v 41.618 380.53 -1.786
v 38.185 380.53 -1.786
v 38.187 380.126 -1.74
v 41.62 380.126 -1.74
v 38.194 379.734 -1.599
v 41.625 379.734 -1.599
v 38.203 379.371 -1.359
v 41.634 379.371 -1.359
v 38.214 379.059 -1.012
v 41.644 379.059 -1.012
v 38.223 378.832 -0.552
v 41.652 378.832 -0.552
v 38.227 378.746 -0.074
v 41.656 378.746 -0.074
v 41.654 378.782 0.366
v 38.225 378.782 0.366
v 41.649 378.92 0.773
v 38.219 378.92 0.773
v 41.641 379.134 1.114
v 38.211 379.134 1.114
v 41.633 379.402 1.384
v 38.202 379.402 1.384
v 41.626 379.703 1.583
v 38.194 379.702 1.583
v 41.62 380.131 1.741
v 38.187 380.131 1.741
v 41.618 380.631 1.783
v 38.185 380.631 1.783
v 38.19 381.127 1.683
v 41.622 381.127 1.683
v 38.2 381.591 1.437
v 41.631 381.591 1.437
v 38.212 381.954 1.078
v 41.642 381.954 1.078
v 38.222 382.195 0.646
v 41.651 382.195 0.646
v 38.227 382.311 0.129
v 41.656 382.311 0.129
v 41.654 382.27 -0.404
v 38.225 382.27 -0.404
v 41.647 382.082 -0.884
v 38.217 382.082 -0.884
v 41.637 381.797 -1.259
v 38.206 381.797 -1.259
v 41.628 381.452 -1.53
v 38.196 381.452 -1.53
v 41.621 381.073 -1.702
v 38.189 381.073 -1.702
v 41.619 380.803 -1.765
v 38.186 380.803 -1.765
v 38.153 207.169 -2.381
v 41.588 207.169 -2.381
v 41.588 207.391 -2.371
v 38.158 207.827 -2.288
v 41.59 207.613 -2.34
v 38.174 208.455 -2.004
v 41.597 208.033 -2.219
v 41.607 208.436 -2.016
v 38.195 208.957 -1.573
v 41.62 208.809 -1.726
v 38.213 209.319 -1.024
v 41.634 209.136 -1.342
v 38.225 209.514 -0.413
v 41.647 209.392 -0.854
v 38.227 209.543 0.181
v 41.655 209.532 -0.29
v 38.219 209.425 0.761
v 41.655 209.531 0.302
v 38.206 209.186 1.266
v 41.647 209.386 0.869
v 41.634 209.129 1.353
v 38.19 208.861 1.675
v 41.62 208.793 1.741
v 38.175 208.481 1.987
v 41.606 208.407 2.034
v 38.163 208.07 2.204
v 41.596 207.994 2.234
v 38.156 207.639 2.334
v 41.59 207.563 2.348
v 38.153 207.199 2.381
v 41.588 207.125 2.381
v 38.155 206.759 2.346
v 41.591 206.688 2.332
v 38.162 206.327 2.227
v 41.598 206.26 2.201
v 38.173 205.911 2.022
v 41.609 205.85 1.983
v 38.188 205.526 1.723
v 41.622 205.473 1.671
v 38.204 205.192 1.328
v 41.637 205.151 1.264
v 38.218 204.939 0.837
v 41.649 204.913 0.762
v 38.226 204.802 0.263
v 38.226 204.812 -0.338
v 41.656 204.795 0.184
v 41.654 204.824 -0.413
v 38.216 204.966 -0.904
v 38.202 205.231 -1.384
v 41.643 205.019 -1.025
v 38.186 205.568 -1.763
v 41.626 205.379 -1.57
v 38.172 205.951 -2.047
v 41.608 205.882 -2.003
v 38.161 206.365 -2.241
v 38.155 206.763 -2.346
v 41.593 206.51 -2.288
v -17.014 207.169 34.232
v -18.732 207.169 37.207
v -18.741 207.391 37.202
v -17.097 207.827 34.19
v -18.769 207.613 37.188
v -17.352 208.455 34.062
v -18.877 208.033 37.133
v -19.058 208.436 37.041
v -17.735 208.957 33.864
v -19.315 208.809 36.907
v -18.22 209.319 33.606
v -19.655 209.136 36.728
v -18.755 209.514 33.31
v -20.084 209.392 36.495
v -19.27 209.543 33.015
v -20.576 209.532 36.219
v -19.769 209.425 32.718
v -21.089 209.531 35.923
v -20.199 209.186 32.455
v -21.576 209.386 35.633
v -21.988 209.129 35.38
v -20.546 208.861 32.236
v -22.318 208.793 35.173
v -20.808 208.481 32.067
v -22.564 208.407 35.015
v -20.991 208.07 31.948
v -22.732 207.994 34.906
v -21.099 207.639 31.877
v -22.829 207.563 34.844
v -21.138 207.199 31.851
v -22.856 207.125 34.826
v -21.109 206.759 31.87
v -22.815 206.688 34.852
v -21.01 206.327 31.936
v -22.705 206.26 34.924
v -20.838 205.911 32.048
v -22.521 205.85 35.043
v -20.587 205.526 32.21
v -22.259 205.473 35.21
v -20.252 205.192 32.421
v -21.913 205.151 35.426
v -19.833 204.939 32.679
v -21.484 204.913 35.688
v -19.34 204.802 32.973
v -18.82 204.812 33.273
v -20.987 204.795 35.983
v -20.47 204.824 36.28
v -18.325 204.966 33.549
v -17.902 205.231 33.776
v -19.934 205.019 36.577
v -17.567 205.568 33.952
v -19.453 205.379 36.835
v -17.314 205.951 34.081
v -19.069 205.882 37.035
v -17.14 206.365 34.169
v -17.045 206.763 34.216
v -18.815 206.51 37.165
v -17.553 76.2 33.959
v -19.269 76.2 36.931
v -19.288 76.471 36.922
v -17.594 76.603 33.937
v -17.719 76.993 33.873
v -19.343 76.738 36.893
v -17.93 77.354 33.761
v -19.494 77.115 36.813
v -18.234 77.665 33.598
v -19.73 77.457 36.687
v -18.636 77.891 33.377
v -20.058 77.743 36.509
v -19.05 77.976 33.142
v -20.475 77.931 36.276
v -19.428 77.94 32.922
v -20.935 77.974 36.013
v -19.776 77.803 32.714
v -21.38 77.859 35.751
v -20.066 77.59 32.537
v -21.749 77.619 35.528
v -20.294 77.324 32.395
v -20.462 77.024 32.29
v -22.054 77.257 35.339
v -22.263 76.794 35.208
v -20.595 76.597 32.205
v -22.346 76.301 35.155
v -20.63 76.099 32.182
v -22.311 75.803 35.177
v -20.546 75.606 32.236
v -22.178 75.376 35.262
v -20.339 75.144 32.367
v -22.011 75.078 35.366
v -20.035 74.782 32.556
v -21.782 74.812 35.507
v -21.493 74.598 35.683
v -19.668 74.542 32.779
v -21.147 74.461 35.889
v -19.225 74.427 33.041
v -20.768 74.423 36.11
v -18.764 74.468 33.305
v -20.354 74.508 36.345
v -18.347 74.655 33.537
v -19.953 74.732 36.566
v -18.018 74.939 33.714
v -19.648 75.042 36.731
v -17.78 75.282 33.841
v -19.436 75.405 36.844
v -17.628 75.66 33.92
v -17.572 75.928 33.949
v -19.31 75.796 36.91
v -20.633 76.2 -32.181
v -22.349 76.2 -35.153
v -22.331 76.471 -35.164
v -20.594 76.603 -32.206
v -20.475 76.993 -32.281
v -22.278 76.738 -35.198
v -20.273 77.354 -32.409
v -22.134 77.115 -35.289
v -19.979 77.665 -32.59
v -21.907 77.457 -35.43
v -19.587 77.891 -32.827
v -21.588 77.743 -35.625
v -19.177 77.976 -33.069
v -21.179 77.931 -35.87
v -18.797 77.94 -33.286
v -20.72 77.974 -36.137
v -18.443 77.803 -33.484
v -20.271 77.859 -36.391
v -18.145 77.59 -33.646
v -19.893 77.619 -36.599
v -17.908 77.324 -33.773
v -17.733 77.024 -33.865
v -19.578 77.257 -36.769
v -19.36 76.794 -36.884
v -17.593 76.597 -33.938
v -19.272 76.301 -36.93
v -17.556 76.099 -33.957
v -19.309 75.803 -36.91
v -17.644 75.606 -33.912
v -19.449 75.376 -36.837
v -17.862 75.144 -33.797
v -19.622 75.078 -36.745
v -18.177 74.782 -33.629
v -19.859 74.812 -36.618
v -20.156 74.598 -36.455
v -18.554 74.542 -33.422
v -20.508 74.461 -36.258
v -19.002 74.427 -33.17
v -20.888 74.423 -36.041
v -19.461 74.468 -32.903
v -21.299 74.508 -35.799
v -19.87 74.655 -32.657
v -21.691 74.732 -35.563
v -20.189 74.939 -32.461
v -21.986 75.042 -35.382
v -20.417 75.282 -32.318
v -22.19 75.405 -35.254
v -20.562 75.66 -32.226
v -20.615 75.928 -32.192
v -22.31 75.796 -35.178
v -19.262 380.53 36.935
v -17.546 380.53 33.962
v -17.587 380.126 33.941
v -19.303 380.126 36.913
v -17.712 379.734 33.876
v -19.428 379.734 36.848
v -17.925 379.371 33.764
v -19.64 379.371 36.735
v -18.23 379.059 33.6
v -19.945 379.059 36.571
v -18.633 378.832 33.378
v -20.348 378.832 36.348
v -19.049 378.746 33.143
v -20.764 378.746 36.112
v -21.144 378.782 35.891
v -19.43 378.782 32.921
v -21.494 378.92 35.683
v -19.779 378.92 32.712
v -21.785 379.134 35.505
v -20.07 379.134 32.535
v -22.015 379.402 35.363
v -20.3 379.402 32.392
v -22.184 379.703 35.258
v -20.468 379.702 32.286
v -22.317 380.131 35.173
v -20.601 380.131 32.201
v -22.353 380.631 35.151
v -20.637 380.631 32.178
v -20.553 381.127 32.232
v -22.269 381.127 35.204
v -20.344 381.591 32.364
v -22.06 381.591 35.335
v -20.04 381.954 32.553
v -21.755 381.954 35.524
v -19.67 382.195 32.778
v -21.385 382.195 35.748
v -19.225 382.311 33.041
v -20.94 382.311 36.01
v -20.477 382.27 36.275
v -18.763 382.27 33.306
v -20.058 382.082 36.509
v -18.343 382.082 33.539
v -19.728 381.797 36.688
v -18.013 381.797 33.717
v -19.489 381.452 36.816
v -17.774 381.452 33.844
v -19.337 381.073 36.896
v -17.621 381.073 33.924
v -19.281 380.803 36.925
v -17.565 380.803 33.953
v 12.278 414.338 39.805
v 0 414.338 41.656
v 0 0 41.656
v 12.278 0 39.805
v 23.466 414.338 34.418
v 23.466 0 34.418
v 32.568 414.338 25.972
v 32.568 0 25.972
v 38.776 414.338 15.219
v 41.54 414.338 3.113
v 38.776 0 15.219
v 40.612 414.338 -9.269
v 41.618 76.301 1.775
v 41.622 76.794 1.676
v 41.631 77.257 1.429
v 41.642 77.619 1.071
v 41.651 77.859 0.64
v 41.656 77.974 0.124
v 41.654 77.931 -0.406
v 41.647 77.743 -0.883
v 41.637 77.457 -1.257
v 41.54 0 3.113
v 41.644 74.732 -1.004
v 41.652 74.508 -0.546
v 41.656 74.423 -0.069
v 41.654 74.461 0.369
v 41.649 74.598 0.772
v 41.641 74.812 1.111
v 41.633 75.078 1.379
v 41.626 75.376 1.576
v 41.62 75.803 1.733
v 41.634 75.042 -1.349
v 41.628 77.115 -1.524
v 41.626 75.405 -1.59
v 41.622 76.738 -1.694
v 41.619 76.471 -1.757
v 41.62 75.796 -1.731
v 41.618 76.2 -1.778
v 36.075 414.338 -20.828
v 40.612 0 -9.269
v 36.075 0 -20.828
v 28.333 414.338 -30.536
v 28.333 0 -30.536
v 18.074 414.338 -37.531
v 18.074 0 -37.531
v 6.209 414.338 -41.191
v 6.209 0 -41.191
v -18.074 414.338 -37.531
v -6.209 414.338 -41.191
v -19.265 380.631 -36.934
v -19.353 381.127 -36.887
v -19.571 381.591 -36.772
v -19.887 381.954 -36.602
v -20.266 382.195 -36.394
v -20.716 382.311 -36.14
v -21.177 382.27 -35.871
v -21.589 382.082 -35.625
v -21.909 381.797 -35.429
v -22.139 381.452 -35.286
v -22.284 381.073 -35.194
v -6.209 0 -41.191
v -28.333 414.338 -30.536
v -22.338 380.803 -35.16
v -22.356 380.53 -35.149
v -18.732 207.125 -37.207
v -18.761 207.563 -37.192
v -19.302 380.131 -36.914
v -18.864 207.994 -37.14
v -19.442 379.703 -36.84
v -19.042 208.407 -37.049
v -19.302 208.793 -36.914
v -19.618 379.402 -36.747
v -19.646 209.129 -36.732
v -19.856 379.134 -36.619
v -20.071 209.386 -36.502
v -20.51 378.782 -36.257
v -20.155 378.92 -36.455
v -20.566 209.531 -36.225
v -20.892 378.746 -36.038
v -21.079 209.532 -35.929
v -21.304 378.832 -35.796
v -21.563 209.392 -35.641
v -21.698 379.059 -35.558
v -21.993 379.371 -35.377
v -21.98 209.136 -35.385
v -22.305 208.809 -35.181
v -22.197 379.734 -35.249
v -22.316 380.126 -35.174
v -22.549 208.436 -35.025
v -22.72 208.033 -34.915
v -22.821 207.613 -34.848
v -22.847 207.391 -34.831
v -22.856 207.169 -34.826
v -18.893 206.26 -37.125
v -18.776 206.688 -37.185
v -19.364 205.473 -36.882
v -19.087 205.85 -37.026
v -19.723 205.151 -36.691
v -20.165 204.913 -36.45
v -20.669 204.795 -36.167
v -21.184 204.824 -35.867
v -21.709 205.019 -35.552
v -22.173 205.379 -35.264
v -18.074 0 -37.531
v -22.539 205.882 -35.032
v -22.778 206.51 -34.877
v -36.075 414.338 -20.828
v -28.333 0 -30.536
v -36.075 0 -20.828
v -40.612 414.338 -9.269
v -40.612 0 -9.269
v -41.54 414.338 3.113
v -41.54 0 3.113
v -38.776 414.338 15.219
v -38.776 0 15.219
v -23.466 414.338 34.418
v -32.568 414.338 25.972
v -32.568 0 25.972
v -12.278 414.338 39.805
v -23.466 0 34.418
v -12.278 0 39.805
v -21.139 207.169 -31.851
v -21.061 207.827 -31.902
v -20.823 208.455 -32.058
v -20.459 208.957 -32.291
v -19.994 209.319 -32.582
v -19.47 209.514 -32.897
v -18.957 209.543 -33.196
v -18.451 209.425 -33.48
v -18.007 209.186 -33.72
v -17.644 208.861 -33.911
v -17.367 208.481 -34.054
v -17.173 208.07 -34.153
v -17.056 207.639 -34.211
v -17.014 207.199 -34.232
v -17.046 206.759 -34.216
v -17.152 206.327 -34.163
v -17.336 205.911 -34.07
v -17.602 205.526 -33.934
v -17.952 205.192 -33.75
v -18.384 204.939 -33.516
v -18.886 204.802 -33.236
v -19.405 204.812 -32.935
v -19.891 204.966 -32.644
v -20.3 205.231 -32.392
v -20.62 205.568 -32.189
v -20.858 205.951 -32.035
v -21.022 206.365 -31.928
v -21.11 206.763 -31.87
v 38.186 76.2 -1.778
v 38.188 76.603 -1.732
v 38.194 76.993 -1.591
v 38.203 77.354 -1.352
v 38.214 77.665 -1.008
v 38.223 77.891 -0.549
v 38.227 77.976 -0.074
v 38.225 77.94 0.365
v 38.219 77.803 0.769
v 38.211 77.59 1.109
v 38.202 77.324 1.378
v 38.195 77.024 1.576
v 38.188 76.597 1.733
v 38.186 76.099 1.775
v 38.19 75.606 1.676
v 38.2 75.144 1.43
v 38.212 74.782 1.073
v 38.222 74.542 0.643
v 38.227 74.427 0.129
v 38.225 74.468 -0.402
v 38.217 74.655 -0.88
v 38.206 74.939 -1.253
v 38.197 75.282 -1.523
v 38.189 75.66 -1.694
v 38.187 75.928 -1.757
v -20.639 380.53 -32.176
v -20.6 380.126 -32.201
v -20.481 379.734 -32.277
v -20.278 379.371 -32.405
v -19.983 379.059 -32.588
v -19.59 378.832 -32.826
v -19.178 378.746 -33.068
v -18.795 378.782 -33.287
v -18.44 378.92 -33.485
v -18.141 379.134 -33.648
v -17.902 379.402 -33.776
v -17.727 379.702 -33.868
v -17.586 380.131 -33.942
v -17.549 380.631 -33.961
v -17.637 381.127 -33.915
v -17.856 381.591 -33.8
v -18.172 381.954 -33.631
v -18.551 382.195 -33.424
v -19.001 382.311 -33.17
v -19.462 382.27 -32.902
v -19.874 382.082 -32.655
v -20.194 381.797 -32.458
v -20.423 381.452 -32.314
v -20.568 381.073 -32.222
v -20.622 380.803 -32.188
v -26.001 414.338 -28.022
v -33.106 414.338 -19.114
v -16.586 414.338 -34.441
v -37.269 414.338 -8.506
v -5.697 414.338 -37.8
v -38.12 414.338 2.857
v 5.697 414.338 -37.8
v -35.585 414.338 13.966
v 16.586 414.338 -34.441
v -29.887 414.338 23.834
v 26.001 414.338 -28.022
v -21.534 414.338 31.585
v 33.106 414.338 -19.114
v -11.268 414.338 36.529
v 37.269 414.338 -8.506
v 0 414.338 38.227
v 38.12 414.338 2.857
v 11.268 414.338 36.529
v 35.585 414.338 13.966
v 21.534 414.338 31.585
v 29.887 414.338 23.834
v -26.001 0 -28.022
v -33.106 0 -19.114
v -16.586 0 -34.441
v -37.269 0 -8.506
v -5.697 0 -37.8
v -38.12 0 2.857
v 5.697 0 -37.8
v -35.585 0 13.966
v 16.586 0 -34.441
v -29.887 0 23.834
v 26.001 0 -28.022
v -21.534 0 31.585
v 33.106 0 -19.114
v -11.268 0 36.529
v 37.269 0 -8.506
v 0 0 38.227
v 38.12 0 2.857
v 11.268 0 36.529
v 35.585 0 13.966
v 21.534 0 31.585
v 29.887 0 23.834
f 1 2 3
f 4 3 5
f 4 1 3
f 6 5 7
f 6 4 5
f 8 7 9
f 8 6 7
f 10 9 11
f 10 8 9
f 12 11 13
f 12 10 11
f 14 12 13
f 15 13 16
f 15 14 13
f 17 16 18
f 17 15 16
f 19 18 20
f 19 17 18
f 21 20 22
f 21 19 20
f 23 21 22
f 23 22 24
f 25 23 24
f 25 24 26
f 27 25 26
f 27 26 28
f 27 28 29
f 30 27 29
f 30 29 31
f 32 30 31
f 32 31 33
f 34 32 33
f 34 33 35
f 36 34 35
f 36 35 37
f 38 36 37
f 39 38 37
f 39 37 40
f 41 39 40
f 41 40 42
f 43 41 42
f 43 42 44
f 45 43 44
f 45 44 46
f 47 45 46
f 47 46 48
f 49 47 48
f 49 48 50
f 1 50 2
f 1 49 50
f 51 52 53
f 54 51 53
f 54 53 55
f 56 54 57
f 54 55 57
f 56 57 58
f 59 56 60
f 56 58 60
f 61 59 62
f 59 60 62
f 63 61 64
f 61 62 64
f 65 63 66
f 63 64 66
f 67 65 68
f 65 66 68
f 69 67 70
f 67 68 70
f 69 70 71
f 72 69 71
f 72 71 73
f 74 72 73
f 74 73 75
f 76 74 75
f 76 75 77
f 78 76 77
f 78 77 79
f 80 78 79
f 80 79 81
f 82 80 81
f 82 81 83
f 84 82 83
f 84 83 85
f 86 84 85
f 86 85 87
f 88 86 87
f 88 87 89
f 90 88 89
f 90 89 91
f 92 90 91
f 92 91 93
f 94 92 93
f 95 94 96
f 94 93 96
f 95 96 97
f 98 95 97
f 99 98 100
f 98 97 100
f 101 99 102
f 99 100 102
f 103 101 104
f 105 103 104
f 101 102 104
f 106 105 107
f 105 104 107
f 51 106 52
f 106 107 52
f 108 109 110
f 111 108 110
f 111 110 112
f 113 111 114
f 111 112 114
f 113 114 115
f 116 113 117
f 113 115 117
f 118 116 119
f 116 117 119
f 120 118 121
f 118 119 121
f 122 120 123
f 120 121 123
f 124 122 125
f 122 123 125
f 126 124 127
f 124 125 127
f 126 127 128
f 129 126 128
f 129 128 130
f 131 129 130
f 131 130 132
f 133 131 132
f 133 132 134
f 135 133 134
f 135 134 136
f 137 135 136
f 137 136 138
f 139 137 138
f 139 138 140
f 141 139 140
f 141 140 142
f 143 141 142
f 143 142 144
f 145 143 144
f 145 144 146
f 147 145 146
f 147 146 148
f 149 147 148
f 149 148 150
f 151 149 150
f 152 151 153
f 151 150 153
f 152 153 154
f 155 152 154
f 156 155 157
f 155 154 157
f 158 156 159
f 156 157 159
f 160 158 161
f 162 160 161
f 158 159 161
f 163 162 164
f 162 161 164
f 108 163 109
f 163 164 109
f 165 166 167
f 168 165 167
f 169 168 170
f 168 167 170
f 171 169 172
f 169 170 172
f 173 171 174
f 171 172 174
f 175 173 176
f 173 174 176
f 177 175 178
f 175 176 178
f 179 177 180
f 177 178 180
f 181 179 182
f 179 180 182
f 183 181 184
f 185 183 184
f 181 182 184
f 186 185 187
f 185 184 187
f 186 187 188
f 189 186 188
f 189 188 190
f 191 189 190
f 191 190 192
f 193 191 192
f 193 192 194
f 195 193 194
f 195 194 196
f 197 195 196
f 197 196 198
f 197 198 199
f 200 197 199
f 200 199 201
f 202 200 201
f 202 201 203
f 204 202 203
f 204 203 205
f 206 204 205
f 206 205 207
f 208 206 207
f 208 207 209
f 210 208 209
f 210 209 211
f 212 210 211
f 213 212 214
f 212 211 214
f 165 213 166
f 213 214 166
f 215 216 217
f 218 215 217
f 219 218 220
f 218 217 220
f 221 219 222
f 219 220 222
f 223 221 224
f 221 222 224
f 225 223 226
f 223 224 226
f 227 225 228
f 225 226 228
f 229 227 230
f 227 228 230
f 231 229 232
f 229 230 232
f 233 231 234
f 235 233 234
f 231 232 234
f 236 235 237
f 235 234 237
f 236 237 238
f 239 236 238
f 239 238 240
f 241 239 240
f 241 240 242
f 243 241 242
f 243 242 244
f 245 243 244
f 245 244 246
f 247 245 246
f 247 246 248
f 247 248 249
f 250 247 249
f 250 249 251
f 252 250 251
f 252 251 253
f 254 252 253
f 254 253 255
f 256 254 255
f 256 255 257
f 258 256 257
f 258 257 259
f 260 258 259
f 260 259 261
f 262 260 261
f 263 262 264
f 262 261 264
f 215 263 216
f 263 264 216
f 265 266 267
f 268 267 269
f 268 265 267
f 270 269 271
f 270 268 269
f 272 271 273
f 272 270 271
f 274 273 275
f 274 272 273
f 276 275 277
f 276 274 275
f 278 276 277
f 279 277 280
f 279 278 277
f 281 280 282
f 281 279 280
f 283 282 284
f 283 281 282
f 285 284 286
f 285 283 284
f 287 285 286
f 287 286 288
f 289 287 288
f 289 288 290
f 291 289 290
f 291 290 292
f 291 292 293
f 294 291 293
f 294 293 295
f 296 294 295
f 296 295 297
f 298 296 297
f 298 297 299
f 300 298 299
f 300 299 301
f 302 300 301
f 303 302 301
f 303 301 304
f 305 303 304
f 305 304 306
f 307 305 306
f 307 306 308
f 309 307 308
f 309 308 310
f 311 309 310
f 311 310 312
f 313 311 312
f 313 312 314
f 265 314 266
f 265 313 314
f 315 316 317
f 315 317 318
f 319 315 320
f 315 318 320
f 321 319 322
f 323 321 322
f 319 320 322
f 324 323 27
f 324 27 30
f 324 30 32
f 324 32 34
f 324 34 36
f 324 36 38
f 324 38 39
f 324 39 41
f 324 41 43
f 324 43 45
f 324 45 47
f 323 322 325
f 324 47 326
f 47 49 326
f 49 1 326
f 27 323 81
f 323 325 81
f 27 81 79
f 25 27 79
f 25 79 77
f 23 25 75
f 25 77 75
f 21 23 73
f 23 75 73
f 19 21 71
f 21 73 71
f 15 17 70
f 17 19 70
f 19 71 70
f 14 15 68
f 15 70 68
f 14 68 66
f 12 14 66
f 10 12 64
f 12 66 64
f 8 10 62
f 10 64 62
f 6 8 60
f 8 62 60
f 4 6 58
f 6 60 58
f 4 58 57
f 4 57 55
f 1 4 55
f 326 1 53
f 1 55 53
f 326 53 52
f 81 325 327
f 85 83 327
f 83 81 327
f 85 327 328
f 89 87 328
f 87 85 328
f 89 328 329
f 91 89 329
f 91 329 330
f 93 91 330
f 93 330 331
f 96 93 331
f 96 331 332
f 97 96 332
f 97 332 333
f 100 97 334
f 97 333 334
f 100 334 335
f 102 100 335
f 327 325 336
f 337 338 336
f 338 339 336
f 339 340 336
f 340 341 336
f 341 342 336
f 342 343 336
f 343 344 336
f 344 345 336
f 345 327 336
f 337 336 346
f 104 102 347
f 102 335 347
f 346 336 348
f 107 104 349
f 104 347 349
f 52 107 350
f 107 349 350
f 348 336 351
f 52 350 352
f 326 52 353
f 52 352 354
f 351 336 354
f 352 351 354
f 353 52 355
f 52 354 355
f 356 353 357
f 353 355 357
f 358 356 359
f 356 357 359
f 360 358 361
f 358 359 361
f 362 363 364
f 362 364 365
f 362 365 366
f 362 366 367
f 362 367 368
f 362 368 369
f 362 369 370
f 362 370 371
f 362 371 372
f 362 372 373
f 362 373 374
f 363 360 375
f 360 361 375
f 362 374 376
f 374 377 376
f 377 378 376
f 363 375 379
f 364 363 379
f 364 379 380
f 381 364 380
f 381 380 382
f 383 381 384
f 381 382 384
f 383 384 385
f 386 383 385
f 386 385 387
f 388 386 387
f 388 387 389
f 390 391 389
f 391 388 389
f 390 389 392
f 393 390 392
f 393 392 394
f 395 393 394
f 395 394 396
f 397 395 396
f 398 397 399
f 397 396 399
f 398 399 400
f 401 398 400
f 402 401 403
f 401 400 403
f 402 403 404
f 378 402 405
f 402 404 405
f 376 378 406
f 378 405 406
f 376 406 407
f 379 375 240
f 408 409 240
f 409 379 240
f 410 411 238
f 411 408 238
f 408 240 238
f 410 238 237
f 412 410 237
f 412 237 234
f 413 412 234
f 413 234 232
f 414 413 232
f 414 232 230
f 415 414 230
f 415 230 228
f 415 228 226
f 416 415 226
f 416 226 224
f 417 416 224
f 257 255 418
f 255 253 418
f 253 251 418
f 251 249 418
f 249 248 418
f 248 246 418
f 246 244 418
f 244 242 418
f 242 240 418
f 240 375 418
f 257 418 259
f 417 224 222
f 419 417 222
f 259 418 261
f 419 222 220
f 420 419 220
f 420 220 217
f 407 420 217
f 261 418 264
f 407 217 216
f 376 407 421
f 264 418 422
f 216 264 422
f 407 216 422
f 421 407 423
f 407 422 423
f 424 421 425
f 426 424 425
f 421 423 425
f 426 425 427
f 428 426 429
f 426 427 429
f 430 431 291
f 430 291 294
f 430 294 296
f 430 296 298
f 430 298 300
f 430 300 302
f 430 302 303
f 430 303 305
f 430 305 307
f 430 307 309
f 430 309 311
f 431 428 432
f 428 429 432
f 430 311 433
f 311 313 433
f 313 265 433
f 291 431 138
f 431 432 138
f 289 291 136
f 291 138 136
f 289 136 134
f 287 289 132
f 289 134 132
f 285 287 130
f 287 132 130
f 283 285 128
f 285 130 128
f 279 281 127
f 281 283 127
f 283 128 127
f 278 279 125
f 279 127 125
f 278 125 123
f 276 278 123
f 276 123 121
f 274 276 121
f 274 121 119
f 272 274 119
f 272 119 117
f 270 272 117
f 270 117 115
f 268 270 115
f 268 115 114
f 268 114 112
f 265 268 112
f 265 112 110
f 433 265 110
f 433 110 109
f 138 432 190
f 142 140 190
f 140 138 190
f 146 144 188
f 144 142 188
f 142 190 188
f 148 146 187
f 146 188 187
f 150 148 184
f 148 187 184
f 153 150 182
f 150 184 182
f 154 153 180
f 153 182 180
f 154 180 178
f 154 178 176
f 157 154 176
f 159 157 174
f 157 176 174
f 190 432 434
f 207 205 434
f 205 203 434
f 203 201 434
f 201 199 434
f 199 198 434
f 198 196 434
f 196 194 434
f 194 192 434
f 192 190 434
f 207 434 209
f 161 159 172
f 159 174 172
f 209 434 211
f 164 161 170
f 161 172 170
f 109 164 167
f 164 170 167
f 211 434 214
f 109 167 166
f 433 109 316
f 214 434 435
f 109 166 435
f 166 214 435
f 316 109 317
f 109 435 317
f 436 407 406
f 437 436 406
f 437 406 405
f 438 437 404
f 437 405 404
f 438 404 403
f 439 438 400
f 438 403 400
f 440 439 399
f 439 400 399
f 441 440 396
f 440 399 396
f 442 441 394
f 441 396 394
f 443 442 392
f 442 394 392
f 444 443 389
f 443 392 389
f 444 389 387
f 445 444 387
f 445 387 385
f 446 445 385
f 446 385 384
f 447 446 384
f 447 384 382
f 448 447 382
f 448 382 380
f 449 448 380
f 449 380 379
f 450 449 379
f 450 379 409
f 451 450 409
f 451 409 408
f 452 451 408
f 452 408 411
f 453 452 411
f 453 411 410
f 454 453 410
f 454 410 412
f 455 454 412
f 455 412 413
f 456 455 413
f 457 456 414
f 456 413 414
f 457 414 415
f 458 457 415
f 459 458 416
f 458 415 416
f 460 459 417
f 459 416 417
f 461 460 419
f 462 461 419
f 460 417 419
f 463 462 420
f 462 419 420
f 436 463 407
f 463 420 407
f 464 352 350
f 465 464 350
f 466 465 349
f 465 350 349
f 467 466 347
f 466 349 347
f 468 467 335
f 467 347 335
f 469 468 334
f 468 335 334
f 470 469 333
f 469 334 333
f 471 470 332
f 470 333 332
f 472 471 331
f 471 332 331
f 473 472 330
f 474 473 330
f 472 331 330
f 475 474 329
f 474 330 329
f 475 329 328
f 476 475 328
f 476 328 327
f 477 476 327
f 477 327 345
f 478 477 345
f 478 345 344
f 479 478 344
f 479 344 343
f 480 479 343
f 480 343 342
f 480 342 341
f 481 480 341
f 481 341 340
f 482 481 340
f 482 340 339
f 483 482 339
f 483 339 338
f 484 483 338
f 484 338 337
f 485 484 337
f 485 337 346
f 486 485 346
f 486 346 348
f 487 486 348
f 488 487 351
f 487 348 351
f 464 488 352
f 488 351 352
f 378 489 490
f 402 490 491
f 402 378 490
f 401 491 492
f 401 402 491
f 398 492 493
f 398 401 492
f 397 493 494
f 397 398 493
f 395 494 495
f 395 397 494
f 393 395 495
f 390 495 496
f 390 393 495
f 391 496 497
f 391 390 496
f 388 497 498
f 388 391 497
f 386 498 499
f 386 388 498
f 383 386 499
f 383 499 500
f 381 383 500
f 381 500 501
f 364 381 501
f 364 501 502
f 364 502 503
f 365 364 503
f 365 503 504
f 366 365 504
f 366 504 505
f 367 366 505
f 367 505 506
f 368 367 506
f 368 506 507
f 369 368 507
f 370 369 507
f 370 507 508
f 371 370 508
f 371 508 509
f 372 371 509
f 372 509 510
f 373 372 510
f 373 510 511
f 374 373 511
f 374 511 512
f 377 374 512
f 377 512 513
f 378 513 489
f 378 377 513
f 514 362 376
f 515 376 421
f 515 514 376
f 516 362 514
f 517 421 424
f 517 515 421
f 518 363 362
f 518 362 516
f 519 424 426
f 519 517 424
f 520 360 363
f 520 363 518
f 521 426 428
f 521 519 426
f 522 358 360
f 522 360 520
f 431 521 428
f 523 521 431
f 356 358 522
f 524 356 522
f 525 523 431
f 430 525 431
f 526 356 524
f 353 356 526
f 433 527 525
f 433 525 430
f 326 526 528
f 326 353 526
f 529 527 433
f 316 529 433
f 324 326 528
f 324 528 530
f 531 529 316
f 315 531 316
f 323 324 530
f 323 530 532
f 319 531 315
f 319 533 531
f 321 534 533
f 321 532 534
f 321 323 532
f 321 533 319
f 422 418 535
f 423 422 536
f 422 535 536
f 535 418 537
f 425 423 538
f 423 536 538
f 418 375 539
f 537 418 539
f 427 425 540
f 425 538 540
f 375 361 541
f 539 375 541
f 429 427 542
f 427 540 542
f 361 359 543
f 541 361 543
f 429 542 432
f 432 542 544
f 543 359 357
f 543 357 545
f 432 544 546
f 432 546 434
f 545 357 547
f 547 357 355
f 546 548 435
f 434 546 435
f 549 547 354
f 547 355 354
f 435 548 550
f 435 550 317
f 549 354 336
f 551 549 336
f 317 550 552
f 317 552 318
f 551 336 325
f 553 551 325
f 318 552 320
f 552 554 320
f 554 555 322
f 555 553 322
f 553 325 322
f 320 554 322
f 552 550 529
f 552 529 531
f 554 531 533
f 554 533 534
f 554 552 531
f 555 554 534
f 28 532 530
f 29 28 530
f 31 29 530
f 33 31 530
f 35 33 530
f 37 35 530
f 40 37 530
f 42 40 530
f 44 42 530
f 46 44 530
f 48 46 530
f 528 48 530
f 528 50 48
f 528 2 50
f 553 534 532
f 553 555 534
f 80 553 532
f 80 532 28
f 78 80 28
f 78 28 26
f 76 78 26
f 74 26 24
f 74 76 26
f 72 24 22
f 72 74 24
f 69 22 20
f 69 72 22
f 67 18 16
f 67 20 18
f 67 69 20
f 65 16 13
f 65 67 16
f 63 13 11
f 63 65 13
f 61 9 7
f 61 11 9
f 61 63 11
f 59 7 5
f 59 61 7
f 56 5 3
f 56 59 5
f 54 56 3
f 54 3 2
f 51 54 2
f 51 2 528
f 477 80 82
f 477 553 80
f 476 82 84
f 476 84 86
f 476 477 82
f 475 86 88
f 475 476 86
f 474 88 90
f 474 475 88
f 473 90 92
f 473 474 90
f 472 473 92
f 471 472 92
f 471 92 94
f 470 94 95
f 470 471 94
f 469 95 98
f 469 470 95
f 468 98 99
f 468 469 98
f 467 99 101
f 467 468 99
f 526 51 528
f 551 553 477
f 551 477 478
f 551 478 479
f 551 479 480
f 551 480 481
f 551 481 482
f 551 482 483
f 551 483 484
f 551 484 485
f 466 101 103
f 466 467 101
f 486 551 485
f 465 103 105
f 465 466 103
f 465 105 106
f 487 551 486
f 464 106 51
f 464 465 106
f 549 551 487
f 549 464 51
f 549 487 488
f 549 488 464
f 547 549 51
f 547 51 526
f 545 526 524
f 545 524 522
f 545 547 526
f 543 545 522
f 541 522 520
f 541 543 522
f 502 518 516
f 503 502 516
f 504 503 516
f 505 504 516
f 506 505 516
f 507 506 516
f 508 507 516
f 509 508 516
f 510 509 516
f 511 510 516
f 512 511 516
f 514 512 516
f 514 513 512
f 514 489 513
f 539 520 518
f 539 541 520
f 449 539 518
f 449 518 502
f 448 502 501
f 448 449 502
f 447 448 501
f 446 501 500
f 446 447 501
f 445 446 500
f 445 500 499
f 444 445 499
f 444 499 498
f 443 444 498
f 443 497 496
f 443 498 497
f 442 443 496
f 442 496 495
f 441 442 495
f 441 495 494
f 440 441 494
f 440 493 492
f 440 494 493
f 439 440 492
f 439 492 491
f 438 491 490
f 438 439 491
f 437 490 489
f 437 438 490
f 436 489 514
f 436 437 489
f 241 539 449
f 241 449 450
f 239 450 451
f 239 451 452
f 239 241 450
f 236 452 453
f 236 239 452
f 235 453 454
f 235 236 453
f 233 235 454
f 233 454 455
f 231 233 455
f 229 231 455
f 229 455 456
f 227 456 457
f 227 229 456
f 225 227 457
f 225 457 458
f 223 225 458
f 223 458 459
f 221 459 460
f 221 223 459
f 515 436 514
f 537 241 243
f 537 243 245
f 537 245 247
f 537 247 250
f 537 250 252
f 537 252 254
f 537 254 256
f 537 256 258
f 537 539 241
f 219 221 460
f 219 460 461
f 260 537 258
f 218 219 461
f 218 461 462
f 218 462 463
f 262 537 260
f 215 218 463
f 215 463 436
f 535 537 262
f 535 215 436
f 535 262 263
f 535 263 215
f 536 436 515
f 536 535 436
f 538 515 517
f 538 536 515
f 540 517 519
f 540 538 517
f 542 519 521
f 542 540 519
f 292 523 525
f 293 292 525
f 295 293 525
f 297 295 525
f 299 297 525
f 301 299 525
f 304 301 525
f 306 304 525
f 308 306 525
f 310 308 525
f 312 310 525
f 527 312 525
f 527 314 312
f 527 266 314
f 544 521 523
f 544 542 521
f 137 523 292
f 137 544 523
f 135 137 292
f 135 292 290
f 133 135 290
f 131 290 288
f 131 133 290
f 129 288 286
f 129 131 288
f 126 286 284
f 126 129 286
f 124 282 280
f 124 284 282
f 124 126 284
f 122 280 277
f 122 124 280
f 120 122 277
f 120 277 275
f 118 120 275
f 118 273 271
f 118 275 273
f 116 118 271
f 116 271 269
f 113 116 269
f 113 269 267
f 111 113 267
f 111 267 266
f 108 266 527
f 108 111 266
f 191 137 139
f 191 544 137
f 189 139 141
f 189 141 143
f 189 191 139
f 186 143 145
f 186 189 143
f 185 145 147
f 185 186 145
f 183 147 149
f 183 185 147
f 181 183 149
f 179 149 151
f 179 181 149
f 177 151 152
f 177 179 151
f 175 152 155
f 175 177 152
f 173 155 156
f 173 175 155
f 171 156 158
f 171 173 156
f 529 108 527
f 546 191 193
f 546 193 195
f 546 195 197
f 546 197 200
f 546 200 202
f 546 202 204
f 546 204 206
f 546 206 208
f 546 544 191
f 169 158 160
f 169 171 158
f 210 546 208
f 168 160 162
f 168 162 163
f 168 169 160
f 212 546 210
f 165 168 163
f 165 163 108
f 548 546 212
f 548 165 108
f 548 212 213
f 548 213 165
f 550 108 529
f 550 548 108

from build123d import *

# Parameters (mm, degrees)
SKETCH1_R                             = 41.656
SKETCH1_R_2                           = 38.227
BOSS_EXTRUDE1_DEPTH                   = 414.3375
CUT_EXTRUDE1_REACH                    = 428.171
CUT_EXTRUDE1_END_RADIUS               = 38.227
SKETCH2_R                             = 1.778
CIRPATTERN1_COUNT                     = 3
PRESSURE_EQUALIZATION_HOLE_REACH      = 428.171
PRESSURE_EQUALIZATION_HOLE_END_RADIUS = 38.227
SKETCH3_R                             = 2.38125
CIRPATTERN2_COUNT                     = 3
CUT_EXTRUDE3_REACH                    = 426.678
CUT_EXTRUDE3_END_RADIUS               = 38.227
SKETCH4_R                             = 1.7859375
CIRPATTERN3_COUNT                     = 3


with BuildPart() as part:
    # Sketch1 → Boss-Extrude1 (new body)
    with BuildSketch(Plane(origin=(0, 0, 0), x_dir=(1, 0, 0), z_dir=(0, 1, 0))):
        with Locations(Location((0, 0, 0), (0, 0, 270))):
            Circle(SKETCH1_R)
        with Locations(Location((0, 0, 0), (0, 0, 270))):
            Circle(SKETCH1_R_2, mode=Mode.SUBTRACT)
    extrude(amount=BOSS_EXTRUDE1_DEPTH)

    # Cut-Extrude1: up to this cylinder (the profile starts outside it)
    cut_extrude1_end = Plane(origin=(0, 76.2, 0), z_dir=(0, -1, 0)) * Cylinder(CUT_EXTRUDE1_END_RADIUS, 933.796, mode=Mode.PRIVATE)
    # Sketch2 → Cut-Extrude1 (cut, up to the surface)
    with BuildSketch(Plane(origin=(-20.828, 0, 36.07515422), x_dir=(0, -1, 0), z_dir=(-0.499999999999998, 0, 0.8660254037844398)), mode=Mode.PRIVATE) as cut_extrude1_sk1:
        with Locations(Location((-76.2, 0, 0), (0, 0, 90))):
            Circle(SKETCH2_R)
    cut_extrude1_tool1 = extrude(cut_extrude1_sk1.sketch, amount=-CUT_EXTRUDE1_REACH, mode=Mode.PRIVATE) - cut_extrude1_end
    cut_extrude1 = cut_extrude1_tool1.solids().sort_by_distance((-20.828, 76.2, 36.075154))[0]
    add(cut_extrude1, mode=Mode.SUBTRACT)

    # CirPattern1: Cut-Extrude1 ×3 about axis
    cirpattern1_axis = Axis((0, -7.62, 0), (0, 1, 0))
    for i in range(1, CIRPATTERN1_COUNT):
        add(cut_extrude1.rotate(cirpattern1_axis, i * 360 / CIRPATTERN1_COUNT), mode=Mode.SUBTRACT)

    # Pressure Equalization Hole: up to this cylinder (the profile starts outside it)
    pressure_equalization_hole_end = Plane(origin=(0, 207.16875, 0), z_dir=(0, -1, 0)) * Cylinder(PRESSURE_EQUALIZATION_HOLE_END_RADIUS, 933.796, mode=Mode.PRIVATE)
    # Sketch3 → Pressure Equalization Hole (cut, up to the surface)
    with BuildSketch(Plane(origin=(-20.828, 0, 36.07515422), x_dir=(0, -1, 0), z_dir=(-0.499999999999998, 0, 0.8660254037844398)), mode=Mode.PRIVATE) as pressure_equalization_hole_sk1:
        with Locations(Location((-207.16875, 0, 0), (0, 0, 90))):
            Circle(SKETCH3_R)
    pressure_equalization_hole_tool1 = extrude(pressure_equalization_hole_sk1.sketch, amount=-PRESSURE_EQUALIZATION_HOLE_REACH, mode=Mode.PRIVATE) - pressure_equalization_hole_end
    pressure_equalization_hole = pressure_equalization_hole_tool1.solids().sort_by_distance((-20.828, 207.16875, 36.075154))[0]
    add(pressure_equalization_hole, mode=Mode.SUBTRACT)

    # CirPattern2: Pressure Equalization Hole ×3 about axis
    cirpattern2_axis = Axis((0, -7.62, 0), (0, 1, 0))
    for i in range(1, CIRPATTERN2_COUNT):
        add(pressure_equalization_hole.rotate(cirpattern2_axis, i * 360 / CIRPATTERN2_COUNT), mode=Mode.SUBTRACT)

    # Cut-Extrude3: up to this cylinder (the profile starts outside it)
    cut_extrude3_end = Plane(origin=(0, 380.5301, 0), z_dir=(0, -1, 0)) * Cylinder(CUT_EXTRUDE3_END_RADIUS, 930.81, mode=Mode.PRIVATE)
    # Sketch4 → Cut-Extrude3 (cut, up to the surface)
    with BuildSketch(Plane(origin=(41.656, 0, 0), x_dir=(0, -1, 0), z_dir=(-1, 0, 0)), mode=Mode.PRIVATE) as cut_extrude3_sk1:
        with Locations(Location((-380.5301, 0, 0), (0, 0, 270))):
            Circle(SKETCH4_R)
    cut_extrude3_tool1 = extrude(cut_extrude3_sk1.sketch, amount=CUT_EXTRUDE3_REACH, mode=Mode.PRIVATE) - cut_extrude3_end
    cut_extrude3 = cut_extrude3_tool1.solids().sort_by_distance((41.656, 380.5301, 0))[0]
    add(cut_extrude3, mode=Mode.SUBTRACT)

    # CirPattern3: Cut-Extrude3 ×3 about axis
    cirpattern3_axis = Axis((0, -7.62, 0), (0, 1, 0))
    for i in range(1, CIRPATTERN3_COUNT):
        add(cut_extrude3.rotate(cirpattern3_axis, i * 360 / CIRPATTERN3_COUNT), mode=Mode.SUBTRACT)


solid = part.part
